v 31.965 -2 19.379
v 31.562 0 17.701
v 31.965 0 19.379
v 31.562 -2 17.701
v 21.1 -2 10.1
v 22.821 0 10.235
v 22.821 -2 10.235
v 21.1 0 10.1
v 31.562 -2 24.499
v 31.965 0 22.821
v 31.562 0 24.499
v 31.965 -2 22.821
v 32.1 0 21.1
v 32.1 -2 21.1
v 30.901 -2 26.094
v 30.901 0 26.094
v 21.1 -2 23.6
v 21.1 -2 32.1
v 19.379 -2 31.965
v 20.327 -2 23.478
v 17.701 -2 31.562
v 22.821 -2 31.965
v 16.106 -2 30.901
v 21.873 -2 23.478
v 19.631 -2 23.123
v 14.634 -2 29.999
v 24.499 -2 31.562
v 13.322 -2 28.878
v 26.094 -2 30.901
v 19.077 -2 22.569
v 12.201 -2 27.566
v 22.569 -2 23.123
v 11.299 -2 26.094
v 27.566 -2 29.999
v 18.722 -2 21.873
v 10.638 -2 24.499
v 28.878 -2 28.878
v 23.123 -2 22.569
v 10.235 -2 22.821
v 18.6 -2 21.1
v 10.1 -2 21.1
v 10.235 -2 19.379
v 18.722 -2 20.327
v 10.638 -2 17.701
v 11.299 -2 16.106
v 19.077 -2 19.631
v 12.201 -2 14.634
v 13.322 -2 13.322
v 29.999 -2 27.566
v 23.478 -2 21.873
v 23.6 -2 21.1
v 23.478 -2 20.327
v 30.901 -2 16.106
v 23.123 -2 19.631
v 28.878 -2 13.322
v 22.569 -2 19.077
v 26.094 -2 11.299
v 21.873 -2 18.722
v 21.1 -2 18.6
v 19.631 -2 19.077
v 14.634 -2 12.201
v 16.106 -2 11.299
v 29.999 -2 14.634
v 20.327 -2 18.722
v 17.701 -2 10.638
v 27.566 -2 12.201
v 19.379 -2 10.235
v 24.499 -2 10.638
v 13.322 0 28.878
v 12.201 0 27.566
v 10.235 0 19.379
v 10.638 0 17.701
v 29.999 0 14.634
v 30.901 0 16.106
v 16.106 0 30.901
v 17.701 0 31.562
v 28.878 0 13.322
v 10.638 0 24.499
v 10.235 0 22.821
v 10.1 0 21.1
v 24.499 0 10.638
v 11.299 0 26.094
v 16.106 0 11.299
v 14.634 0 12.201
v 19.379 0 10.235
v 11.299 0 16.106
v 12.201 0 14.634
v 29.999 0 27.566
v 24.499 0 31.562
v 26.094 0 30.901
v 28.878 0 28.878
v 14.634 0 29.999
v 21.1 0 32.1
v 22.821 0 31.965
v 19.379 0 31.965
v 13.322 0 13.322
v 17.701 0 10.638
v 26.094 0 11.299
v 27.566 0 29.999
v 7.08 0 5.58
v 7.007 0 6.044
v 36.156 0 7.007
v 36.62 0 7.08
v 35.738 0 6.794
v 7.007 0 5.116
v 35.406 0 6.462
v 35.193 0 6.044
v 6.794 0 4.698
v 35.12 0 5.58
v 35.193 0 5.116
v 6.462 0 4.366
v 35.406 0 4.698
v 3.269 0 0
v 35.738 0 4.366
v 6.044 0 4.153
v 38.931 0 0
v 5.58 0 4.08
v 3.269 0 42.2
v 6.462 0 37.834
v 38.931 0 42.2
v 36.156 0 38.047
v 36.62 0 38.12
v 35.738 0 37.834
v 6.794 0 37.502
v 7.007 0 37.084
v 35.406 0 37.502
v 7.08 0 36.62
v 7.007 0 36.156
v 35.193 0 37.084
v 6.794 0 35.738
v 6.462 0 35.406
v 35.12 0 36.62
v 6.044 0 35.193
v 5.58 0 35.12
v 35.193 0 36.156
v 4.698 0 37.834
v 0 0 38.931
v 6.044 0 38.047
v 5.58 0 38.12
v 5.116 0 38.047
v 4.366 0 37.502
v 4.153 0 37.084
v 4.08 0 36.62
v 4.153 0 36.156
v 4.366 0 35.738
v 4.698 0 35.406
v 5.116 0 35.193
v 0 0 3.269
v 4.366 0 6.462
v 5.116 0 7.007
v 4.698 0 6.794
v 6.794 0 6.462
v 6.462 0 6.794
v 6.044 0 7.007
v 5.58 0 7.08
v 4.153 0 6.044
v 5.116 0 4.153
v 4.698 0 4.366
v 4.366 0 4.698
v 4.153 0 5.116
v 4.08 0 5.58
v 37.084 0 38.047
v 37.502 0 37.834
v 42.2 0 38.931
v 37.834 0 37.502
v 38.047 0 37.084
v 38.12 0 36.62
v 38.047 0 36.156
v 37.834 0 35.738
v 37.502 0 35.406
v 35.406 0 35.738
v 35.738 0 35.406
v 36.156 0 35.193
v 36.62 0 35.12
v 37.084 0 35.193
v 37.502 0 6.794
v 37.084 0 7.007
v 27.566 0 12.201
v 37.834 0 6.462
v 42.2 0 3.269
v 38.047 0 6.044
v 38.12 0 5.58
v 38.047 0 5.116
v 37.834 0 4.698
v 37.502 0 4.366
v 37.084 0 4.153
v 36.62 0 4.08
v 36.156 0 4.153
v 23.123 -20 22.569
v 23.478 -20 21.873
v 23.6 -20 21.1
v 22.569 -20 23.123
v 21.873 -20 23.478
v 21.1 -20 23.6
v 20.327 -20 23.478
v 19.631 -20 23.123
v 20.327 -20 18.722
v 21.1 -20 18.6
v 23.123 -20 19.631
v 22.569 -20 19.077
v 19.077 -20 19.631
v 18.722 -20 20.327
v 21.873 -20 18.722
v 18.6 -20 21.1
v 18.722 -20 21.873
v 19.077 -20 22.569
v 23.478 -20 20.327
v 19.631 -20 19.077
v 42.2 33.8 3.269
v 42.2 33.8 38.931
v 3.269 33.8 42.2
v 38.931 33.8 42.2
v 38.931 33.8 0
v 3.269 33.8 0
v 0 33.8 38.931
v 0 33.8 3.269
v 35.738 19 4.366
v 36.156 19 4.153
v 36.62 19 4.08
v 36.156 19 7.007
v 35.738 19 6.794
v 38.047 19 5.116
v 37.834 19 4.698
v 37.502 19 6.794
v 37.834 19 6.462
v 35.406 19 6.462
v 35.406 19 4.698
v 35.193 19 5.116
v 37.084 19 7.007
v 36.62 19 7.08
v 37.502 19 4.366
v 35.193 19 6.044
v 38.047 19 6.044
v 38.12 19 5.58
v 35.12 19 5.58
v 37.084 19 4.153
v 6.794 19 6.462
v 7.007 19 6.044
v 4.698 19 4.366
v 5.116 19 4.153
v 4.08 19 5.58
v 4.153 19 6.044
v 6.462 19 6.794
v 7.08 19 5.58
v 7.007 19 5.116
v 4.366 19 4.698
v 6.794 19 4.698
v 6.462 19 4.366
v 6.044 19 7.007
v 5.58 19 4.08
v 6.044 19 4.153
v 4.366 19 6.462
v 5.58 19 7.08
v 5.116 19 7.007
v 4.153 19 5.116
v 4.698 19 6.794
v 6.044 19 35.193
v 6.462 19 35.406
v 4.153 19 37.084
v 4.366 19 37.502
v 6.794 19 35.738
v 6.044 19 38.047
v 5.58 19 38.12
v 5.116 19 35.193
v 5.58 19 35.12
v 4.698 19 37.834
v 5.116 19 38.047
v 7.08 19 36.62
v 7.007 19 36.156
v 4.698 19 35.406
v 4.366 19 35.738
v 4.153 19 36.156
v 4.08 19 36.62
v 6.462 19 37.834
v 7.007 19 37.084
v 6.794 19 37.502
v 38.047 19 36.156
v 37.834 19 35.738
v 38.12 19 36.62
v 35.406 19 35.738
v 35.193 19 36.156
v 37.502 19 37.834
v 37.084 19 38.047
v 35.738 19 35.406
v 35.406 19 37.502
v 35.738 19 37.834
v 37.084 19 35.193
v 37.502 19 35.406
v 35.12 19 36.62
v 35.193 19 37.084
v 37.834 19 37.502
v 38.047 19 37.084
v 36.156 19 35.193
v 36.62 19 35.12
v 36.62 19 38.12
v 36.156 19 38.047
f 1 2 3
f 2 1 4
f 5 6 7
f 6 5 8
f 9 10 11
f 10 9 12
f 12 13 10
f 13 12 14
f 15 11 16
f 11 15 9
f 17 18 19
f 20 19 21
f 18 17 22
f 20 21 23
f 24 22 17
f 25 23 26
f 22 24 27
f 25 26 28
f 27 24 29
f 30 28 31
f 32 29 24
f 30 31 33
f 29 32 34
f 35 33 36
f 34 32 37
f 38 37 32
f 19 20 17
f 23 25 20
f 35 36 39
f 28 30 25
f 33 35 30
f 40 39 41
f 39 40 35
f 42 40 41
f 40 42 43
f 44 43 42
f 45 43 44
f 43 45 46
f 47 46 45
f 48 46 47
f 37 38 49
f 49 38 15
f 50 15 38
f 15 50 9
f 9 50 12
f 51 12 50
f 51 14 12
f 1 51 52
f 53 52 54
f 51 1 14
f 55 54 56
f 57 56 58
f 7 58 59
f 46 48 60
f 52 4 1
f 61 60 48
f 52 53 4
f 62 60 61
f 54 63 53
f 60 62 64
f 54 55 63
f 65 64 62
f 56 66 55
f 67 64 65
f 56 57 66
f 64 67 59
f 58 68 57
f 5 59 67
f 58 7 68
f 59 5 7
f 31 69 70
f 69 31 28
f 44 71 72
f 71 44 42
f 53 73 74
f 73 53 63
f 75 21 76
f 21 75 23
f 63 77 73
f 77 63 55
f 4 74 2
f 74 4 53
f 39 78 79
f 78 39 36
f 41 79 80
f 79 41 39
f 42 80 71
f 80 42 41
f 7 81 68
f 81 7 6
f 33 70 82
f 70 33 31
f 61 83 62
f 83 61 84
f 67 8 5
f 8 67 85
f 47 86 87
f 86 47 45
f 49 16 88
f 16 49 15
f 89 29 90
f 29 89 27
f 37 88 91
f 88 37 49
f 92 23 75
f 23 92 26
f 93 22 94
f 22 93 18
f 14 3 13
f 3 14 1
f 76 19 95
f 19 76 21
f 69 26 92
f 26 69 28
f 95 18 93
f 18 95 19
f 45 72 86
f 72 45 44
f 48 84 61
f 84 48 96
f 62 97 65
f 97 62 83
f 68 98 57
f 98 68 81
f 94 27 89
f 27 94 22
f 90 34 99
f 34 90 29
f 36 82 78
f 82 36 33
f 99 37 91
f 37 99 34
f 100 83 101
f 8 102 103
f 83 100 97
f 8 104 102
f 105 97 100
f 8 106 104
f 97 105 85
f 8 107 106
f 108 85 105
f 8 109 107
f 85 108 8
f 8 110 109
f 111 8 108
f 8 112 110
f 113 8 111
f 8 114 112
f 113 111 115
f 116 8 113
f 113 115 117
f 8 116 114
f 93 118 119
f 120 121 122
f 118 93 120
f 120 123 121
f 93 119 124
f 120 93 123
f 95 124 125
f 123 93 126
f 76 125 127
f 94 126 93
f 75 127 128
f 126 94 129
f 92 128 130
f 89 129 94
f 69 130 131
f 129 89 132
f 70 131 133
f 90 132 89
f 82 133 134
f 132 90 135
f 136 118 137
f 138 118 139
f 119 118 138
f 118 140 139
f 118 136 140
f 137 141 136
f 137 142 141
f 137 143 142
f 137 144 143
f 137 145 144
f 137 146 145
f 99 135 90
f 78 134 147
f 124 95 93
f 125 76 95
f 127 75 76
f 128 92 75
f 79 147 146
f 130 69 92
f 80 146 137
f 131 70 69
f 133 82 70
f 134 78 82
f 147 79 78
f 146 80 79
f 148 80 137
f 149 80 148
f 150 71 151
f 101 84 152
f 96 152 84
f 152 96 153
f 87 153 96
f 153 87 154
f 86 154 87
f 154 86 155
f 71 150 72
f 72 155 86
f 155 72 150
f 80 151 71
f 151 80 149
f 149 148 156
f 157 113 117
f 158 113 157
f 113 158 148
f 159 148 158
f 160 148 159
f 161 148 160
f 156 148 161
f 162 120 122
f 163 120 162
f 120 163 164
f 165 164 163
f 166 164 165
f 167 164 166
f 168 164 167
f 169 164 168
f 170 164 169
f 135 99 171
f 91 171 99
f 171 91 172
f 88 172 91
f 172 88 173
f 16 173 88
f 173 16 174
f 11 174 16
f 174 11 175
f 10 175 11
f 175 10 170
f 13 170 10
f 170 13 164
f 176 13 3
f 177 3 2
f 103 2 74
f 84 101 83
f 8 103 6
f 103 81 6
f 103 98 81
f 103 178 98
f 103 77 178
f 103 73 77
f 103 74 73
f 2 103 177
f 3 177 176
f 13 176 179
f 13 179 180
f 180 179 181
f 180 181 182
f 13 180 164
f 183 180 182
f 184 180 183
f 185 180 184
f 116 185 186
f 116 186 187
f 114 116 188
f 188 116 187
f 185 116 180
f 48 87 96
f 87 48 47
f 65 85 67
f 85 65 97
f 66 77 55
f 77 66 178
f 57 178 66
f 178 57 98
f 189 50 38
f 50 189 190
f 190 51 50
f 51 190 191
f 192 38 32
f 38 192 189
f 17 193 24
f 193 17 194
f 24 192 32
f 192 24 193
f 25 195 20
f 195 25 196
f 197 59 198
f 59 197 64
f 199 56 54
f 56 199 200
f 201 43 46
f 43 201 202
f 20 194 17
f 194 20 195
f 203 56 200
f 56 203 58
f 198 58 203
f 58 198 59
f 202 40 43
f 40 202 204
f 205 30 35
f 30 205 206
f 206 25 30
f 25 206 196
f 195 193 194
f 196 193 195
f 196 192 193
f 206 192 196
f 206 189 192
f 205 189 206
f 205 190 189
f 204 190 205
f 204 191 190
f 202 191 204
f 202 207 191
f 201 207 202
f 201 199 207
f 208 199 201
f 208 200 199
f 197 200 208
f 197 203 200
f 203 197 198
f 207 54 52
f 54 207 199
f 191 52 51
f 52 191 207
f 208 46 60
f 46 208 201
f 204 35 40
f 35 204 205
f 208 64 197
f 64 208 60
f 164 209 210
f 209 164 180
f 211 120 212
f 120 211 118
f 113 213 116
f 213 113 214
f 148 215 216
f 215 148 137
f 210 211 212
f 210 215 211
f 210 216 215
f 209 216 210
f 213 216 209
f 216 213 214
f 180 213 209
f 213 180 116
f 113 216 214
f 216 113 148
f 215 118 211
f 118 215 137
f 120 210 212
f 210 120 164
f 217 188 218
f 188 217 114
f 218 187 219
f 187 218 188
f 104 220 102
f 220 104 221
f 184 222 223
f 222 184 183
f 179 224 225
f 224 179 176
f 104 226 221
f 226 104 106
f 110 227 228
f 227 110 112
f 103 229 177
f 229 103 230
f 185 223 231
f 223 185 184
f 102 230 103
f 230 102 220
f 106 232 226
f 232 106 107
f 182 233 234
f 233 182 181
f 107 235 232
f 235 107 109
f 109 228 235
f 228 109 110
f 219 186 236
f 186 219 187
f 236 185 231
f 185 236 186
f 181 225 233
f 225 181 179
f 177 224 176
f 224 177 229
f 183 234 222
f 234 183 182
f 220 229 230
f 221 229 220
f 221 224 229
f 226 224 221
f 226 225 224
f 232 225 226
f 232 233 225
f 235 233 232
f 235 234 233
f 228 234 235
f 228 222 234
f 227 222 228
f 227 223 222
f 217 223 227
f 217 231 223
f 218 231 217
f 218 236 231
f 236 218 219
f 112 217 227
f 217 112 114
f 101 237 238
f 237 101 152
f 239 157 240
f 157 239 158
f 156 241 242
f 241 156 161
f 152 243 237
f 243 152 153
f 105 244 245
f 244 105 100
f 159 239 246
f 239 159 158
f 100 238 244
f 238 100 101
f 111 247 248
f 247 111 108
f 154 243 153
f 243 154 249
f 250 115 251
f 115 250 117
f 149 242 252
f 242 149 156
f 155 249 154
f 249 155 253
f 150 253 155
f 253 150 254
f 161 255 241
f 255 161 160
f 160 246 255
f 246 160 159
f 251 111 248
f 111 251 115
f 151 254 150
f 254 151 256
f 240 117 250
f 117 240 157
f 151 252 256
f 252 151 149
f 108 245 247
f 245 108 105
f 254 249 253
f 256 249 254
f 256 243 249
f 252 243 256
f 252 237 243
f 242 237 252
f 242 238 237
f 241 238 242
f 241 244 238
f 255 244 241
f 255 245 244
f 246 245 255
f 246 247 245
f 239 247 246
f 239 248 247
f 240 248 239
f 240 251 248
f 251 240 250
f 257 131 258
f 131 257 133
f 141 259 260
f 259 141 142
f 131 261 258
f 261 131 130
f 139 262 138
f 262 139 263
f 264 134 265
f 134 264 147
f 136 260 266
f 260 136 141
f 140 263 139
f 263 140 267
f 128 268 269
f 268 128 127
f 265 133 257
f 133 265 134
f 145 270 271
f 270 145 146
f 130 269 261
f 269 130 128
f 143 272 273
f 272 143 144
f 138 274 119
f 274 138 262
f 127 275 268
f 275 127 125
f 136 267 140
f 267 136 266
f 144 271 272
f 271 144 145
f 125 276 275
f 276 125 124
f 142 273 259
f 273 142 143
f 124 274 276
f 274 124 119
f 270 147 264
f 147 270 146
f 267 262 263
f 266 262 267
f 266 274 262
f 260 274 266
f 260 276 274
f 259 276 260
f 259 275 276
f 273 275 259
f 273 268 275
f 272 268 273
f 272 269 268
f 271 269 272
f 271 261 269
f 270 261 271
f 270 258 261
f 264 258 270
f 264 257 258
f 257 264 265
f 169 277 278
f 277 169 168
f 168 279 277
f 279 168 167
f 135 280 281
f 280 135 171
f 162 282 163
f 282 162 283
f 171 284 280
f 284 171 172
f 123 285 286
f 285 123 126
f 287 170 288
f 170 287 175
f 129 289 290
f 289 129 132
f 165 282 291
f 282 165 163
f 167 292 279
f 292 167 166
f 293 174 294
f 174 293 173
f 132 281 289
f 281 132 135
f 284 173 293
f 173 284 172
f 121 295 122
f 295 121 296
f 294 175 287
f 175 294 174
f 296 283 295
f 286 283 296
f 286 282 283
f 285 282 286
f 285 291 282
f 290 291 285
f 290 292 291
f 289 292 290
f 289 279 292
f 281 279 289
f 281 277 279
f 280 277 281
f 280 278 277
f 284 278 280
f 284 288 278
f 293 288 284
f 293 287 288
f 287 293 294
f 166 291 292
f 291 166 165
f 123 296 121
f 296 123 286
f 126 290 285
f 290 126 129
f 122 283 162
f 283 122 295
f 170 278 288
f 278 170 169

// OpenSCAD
module Nema17()
{
	nema_side = 42.2;
	nema_bolts = 31.04/2.0;
	nema_depth = 3.8;
	M3 = 3.0/2.0;

	//bevel corners
	r1 = nema_side/2- nema_bolts;
	r2 = sqrt(2)* r1 ;
	r=(r2-r1)*2;
	
	
	difference()
	{
	
		union()
		{
			cube([nema_side,33.8,nema_side]);
	
			translate( [nema_side/2,0,nema_side/2]) 
				rotate(90,[1,0,0]) 
					{
						cylinder(r = 11, h = 2, $fn = 40);
						cylinder(r = 5.0/2.0, h = 20, $fn = 20);
					}
		}
	
	
		translate( [nema_side/2,0,nema_side/2])
		{
	
			for(j=[1:4])
			{
				rotate(90*j,[0,1,0]) 
					translate( [nema_side/2,33.8/2,nema_side/2]) 
				rotate(45,[0,1,0]) 
				cube([30,50,r], center = true);
			}
	
			//bolt holes
			for(j=[1:4])
			{		
				rotate(90*j,[0,1,0]) 
				translate( [nema_bolts,0,nema_bolts]) 
					rotate(-90,[1,0,0]) 
					{
						cylinder(r = M3, h = nema_depth*10, $fn = 20,center=true);
					}
	
			}
		}
	}
}
	
	
Nema17();
